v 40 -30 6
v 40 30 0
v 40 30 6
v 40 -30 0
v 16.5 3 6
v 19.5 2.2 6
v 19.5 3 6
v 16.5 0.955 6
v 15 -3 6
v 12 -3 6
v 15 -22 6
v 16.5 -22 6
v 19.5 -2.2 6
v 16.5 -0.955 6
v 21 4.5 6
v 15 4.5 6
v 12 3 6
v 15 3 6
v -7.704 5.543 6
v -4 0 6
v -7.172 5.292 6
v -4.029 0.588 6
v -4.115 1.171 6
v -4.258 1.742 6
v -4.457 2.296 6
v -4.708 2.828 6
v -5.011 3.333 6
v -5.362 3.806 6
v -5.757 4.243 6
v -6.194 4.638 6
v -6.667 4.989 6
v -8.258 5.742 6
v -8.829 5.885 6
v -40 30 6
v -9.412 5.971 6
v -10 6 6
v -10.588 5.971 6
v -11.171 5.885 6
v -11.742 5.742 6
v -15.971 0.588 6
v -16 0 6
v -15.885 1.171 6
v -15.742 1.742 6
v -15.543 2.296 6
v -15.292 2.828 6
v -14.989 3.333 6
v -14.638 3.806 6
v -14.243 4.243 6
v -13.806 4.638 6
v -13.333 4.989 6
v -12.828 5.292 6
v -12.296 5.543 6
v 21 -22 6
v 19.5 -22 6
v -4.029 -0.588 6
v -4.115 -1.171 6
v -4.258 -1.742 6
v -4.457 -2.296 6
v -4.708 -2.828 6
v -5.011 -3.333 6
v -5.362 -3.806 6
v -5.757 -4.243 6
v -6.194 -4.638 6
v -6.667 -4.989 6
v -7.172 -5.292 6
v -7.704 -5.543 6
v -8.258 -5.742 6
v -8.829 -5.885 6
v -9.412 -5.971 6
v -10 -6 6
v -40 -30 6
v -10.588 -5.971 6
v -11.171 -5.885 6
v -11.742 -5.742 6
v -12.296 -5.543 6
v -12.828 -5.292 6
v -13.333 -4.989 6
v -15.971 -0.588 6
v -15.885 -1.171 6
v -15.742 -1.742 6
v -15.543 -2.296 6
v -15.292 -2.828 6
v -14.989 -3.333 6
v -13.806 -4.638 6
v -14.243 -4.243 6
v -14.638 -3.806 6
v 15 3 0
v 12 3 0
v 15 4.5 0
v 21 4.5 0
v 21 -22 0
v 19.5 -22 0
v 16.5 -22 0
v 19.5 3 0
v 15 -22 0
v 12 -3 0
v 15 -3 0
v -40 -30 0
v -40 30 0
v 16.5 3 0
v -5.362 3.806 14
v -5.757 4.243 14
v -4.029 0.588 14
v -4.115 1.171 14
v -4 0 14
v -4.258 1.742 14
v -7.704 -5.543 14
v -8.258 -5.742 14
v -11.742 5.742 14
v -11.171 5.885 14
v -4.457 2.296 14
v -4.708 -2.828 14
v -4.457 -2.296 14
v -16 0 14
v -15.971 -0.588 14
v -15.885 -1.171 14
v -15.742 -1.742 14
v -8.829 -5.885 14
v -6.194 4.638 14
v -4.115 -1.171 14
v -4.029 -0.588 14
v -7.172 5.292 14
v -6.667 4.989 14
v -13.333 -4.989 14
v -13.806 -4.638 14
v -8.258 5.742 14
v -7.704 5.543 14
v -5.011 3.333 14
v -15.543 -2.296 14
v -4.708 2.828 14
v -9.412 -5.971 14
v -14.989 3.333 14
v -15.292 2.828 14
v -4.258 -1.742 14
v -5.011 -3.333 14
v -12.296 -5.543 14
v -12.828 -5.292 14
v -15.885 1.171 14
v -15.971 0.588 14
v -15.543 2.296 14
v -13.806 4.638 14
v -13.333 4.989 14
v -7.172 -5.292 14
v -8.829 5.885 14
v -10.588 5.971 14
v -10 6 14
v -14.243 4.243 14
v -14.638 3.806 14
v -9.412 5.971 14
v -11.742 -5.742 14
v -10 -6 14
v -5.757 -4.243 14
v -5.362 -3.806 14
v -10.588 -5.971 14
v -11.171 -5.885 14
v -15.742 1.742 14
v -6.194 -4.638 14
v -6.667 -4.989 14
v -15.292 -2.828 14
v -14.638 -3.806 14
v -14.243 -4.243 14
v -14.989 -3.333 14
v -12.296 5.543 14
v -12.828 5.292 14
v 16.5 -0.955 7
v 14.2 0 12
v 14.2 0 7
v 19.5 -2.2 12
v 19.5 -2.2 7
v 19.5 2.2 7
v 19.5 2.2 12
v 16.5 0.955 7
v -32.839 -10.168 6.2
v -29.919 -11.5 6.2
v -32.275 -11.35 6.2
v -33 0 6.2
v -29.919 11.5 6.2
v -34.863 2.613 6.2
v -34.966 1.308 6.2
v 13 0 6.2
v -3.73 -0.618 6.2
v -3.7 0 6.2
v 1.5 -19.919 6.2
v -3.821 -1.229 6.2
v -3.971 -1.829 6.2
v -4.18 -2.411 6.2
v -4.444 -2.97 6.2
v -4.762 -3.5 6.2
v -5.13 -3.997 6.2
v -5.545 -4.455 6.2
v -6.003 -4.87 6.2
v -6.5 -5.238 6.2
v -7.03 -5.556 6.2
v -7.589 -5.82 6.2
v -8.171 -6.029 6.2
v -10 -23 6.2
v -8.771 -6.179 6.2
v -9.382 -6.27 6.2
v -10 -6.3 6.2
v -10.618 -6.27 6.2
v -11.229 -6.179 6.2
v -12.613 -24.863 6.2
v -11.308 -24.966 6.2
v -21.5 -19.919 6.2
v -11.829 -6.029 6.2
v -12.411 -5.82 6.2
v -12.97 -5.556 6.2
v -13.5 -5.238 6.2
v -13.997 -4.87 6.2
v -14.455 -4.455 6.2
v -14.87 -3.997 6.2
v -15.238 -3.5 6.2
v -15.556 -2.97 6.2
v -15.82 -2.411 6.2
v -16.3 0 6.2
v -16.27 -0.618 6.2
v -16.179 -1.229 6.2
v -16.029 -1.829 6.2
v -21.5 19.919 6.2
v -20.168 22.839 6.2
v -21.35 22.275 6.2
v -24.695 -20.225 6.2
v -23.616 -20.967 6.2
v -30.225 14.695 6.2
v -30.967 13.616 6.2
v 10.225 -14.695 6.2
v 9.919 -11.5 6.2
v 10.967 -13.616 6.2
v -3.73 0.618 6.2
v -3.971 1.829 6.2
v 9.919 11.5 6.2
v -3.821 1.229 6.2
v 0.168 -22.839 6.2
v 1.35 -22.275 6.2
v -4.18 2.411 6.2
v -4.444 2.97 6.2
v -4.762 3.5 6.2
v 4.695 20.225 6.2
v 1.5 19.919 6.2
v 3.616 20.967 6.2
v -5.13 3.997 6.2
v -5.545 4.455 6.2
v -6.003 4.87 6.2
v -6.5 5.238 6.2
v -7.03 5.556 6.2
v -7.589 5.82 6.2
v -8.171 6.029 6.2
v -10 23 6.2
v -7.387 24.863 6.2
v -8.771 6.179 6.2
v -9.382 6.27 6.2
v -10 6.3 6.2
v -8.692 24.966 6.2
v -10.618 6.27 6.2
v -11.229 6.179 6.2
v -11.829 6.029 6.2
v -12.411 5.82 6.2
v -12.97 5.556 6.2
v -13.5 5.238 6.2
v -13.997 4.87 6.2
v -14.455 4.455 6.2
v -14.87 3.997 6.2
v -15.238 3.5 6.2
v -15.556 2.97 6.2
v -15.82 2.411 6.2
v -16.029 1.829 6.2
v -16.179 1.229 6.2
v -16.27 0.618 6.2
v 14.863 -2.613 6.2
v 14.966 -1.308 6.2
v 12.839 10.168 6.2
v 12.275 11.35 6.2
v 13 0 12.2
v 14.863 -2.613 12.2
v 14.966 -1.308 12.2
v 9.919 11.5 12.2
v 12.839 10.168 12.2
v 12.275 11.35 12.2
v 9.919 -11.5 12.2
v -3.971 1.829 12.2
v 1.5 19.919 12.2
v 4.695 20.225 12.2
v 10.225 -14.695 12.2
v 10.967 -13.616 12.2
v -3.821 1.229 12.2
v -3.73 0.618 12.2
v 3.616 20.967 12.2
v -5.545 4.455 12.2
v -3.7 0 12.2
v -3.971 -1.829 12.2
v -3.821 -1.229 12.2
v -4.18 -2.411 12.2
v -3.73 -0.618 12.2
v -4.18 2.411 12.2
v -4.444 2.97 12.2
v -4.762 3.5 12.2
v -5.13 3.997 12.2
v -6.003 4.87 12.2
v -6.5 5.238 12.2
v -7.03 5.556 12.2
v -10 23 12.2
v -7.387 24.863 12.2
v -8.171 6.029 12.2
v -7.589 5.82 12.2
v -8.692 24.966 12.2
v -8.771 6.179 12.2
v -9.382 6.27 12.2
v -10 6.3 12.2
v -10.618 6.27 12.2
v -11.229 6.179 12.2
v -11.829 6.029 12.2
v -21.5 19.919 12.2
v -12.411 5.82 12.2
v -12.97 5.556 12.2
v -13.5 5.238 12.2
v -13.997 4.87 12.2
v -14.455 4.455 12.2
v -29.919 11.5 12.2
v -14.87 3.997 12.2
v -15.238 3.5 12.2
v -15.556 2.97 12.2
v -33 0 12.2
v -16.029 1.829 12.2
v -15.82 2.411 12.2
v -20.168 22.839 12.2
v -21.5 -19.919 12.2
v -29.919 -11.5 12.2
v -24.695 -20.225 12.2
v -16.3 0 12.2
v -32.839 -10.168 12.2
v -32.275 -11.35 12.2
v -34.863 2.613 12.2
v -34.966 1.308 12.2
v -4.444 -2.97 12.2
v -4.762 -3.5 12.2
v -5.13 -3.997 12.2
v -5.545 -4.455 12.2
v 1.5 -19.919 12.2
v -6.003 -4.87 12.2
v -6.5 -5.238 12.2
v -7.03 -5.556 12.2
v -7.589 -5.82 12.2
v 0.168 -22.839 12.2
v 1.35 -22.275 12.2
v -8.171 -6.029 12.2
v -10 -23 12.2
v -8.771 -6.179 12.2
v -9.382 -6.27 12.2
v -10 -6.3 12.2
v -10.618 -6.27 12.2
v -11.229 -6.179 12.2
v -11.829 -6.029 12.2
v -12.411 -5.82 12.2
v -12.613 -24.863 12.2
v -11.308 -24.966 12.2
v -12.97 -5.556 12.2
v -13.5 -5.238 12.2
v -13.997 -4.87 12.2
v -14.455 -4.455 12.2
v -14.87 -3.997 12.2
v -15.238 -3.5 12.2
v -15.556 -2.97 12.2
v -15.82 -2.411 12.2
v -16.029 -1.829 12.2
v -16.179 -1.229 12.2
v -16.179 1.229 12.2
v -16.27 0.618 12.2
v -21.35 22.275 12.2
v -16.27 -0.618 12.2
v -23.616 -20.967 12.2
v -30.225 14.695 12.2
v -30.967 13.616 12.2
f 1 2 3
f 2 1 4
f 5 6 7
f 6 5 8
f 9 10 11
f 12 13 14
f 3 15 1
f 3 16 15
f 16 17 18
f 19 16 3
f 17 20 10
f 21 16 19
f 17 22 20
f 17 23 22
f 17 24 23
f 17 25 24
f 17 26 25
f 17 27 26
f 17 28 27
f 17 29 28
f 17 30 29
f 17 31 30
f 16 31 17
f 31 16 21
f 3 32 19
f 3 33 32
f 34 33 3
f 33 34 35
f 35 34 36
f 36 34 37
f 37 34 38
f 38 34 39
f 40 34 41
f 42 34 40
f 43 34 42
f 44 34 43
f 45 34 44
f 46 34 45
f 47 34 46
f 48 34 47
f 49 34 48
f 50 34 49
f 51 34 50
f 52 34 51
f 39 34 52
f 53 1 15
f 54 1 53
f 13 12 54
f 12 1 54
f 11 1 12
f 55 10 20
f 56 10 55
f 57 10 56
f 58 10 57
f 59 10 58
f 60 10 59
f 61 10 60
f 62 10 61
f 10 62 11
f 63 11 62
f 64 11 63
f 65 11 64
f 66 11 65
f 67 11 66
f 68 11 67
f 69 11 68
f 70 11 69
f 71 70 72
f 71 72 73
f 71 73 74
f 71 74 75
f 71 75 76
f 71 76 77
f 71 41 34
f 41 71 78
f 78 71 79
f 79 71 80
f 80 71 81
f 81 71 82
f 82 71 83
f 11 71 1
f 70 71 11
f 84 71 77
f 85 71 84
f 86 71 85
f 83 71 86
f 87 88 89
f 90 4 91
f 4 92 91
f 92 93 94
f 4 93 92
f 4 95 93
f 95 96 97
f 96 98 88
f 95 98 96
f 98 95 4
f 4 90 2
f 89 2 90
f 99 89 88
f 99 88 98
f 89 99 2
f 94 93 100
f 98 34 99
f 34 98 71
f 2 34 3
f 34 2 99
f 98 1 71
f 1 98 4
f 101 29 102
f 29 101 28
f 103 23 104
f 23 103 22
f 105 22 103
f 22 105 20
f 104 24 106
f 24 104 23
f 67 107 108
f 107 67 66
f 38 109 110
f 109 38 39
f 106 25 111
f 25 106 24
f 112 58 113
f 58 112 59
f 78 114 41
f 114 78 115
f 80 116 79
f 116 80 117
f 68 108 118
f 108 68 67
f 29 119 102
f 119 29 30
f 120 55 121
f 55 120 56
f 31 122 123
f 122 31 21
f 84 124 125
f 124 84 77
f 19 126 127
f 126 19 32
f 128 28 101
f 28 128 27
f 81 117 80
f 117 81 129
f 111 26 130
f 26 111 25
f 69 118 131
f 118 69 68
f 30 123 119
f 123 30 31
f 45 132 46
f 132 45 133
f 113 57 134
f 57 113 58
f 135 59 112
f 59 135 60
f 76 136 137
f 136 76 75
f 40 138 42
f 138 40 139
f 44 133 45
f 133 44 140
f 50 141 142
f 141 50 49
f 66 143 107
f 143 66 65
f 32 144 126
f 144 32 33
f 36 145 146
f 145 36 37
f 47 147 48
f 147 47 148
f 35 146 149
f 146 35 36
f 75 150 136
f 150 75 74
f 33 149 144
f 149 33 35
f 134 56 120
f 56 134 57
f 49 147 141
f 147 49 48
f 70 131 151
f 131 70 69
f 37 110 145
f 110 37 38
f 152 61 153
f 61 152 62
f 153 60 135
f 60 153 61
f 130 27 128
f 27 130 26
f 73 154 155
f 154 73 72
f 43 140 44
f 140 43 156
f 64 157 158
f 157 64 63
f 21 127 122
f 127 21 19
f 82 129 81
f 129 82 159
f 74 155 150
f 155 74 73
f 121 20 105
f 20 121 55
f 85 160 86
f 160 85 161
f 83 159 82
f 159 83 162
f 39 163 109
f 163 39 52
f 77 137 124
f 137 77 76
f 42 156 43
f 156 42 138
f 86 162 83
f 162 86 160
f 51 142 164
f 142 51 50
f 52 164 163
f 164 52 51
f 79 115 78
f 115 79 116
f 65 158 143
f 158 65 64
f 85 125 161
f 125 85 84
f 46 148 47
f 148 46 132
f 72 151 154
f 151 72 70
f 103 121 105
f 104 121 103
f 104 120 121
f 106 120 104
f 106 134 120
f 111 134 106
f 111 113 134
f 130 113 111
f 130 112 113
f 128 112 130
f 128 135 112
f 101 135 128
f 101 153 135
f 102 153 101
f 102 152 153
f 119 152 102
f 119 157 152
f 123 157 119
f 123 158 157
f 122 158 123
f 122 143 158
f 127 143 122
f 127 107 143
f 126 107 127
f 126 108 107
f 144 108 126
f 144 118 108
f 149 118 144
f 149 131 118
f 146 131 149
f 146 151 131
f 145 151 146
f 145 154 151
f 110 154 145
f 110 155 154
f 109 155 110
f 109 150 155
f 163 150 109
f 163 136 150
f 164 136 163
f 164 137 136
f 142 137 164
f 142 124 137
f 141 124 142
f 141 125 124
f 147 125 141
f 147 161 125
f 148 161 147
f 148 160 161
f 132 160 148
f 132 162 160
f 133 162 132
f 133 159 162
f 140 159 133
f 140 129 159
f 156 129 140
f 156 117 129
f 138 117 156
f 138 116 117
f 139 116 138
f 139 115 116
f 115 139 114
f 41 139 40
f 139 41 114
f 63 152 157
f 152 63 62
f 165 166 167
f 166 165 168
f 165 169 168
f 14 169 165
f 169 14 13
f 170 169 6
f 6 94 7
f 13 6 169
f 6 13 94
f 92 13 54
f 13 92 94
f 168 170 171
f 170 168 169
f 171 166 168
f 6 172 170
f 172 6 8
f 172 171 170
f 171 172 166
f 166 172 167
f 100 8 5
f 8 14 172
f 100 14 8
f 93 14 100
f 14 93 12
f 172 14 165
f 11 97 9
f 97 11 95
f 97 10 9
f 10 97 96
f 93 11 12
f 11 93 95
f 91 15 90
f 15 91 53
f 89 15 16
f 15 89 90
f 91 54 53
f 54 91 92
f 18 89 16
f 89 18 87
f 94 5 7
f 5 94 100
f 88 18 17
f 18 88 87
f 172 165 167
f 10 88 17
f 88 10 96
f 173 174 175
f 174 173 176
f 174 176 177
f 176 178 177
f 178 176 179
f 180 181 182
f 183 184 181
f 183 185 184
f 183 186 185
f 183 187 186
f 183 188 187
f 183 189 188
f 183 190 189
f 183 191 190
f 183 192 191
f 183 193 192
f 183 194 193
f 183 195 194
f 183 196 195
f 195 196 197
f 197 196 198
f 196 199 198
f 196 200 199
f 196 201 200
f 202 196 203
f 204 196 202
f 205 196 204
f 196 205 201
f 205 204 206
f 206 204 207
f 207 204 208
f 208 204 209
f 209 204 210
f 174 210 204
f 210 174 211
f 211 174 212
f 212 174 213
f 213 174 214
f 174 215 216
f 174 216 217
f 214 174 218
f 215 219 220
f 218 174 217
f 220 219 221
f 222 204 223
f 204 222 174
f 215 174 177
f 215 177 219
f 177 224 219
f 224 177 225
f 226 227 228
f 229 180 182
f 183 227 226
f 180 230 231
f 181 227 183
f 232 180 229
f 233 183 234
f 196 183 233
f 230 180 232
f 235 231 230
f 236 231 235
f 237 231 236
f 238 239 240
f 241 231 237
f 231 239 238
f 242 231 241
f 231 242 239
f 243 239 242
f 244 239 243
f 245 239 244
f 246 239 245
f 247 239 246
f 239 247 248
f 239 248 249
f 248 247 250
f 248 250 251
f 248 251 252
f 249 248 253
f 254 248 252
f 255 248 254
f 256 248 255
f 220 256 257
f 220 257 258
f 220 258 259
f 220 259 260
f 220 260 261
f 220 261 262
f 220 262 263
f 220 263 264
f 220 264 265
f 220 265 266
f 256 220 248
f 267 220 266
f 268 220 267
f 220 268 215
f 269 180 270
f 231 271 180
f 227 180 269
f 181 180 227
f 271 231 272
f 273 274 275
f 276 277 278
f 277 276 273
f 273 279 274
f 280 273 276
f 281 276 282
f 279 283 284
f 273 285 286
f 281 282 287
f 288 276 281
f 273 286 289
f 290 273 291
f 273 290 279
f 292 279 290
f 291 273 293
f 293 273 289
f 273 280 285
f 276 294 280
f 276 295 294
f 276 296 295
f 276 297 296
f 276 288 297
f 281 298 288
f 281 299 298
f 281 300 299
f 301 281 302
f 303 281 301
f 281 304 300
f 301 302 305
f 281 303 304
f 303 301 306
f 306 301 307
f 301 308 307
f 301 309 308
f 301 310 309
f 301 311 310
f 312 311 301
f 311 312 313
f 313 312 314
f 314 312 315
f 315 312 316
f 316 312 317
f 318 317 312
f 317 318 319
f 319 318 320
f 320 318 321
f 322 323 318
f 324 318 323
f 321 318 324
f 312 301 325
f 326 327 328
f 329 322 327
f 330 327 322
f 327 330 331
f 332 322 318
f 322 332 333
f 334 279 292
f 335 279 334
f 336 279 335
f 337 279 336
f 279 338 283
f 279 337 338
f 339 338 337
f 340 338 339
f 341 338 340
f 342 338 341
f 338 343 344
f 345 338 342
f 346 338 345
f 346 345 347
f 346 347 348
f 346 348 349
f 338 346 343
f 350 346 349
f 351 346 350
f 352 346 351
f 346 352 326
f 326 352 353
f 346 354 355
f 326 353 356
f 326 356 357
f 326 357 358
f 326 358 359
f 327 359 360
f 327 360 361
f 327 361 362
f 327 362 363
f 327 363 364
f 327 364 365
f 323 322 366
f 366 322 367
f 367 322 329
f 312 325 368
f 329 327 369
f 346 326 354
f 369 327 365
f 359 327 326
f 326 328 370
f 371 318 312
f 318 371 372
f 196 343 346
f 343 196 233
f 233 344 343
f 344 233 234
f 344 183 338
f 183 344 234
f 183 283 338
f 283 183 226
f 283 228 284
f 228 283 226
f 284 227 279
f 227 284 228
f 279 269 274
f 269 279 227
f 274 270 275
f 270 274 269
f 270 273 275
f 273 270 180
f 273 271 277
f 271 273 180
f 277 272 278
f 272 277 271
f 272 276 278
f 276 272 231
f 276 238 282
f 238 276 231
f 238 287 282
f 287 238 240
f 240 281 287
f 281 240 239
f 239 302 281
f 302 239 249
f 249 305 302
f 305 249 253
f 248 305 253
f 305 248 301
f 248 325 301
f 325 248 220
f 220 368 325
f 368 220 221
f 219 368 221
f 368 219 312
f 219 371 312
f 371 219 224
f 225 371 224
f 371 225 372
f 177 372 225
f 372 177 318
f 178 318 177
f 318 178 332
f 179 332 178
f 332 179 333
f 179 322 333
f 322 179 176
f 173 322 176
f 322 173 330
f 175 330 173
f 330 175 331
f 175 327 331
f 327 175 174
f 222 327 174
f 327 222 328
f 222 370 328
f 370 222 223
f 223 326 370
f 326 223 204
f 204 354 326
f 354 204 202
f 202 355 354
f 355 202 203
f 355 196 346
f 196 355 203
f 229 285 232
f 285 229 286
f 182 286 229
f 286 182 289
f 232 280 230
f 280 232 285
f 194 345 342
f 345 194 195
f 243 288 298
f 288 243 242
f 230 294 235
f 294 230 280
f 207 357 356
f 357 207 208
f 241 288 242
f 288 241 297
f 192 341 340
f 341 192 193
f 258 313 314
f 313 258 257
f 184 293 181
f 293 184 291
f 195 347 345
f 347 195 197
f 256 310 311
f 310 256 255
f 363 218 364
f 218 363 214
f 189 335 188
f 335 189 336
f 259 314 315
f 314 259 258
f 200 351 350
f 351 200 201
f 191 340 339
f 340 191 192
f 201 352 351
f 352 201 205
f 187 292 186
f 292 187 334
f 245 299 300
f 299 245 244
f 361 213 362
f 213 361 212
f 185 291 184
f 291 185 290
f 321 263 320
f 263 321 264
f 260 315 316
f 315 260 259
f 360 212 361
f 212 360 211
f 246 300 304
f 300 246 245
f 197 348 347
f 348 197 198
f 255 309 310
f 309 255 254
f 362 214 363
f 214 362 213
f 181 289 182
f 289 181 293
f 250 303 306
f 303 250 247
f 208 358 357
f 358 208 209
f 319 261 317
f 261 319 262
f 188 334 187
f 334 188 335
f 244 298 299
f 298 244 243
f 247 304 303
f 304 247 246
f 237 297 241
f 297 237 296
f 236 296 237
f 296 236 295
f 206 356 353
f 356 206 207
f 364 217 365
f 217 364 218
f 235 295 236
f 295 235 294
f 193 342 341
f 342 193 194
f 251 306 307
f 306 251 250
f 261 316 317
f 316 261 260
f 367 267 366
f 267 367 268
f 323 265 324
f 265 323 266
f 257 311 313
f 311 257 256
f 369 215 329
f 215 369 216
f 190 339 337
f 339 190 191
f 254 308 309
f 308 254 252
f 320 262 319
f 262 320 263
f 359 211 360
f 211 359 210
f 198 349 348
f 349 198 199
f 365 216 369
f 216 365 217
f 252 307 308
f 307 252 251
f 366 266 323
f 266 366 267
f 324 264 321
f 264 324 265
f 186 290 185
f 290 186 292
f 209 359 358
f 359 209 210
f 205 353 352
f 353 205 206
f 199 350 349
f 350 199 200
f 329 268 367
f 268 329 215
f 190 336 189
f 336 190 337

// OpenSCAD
/* Ratchet wheel with spring pawl - desk demo, PLA, 0.4 mm nozzle, no supports.
   Wheel (~50 mm, 12 teeth) turns on a post; the pawl is part of the base on a
   flexible arm cut from the plate. Free way is clockwise seen from above
   (negative rotation about +Z). */
part = "assembly"; // [wheel:Wheel, base:Base, assembly:Assembly]

cadverify_only = "";
module instance(name, part, unit = 1) {
    echo(cadverify_instance = [name, part, unit]);
    if (cadverify_only == "" || cadverify_only == name) children();
}

// ---------- parameters (mm) ----------
Rtip = 25;          // wheel outer radius (50 mm across)
Rroot = 23;         // wheel root radius (tooth height 2 mm)
wheel_t = 6;        // wheel thickness
hole_D = 12.6;      // wheel centre hole diameter
post_D = 12;        // base post diameter (0.6 mm play on diameter)
post_h = 8;         // post height above base top
base_t = 6;         // base plate thickness
base_x = 80;
base_y = 60;
wheel_cx = -10;     // wheel centre in base/assembly XY
wheel_cy = 0;
wheel_gap = 0.2;    // wheel bottom above base top
wheel_lift_z = base_t + wheel_gap;   // 6.2 wheel bottom in assembly
post_top_z = base_t + post_h;        // 14
pawl_tip_x = 14.2;  // pawl tip: 0.8 inside tip circle, 1.2 off root
beam_x0 = 16.5; beam_x1 = 19.5;      // flexible arm: 3 mm wide ...
beam_y0 = -22; beam_y1 = 3;          // ... 25 mm long, fixed south, free north
slot_w = 1.5;       // slot width (clears a 0.4 mm nozzle)
pawl_h = 6;         // pawl height above plate (meets wheel band 6.2..12.2)
rest_angle = 0;     // gullet bottom centred on pawl tip

// tooth k: root at 30k, shallow rise to tip at 30k+24, tip land to +27,
// steep drop to root at +30. Shallow face cams the pawl out (free way),
// steep face pushes along the arm (locks reverse).
function wheel_pts() = [
    for(k=[0:11]) for(j=[0:2])
        j==0 ? [Rroot*cos(k*30), Rroot*sin(k*30)]
      : j==1 ? [Rtip*cos(k*30+24), Rtip*sin(k*30+24)]
             : [Rtip*cos(k*30+27), Rtip*sin(k*30+27)]
];

module wheel() {
    difference() {
        linear_extrude(height=wheel_t, convexity=4)
            polygon(points=wheel_pts());
        translate([0,0,-1]) cylinder(d=hole_D, h=wheel_t+2, $fn=64);
    }
}

module base() {
    difference() {
        union() {
            // plate
            translate([-base_x/2, -base_y/2, 0]) cube([base_x, base_y, base_t]);
            // post the wheel turns on
            translate([wheel_cx, wheel_cy, base_t]) cylinder(d=post_D, h=post_h, $fn=64);
            // pawl wedge: tip near the wheel, root fused onto the free end of the arm
            translate([0,0,base_t]) linear_extrude(height=pawl_h, convexity=2)
                polygon(points=[[pawl_tip_x, 0],[beam_x1, 2.2],[beam_x1, -2.2]]);
        }
        // U-slot freeing the arm (one connected through opening) + window under pawl tip
        translate([beam_x0-slot_w, beam_y0, -1]) cube([slot_w, 19, base_t+2]); // west x15..16.5 y-22..-3
        translate([beam_x1, beam_y0, -1]) cube([slot_w, 26.5, base_t+2]);      // east x19.5..21 y-22..4.5
        translate([beam_x0-slot_w, beam_y1, -1]) cube([6, slot_w, base_t+2]);  // north x15..21 y3..4.5
        translate([12, -3, -1]) cube([4.5, 6, base_t+2]);                       // window x12..16.5 y-3..3
    }
}

module assembly() {
    instance("base_inst", "base", 1) base();
    instance("wheel_inst", "wheel", 1)
        translate([wheel_cx, wheel_cy, wheel_lift_z]) rotate([0,0,rest_angle]) wheel();
}

// ---------- specs (computed from parameters) ----------
wheel_spec = [
    ["bounds", [[-Rtip, -Rtip, 0], [Rtip, Rtip, wheel_t]]],
    ["bodies", 1],
    ["through_holes", 1],
    ["support_faces", [["bed", "-z", 800]]],
    ["overhangs_allowed", []],
    ["copies", 1],
    ["details", [
        ["axle_hole", "hole", [0, 0, wheel_t+4], [0, 0, -1], [[0, hole_D], [wheel_t, hole_D]]],
        ["rim_thick", "thickness", [15, 0, wheel_t+4], [0, 0, -1], wheel_t],
        ["tooth0", "material", [[22.05, 7.71, 0], [23.05, 8.71, wheel_t]], 0.5],
        ["tooth4", "material", [[-18.89, 14.93, 0], [-17.89, 15.93, wheel_t]], 0.5],
        ["tooth8", "material", [[-4.67, -24.14, 0], [-3.67, -23.14, wheel_t]], 0.5]
    ]]
];

base_spec = [
    ["bounds", [[-base_x/2, -base_y/2, 0], [base_x/2, base_y/2, post_top_z]]],
    ["bodies", 1],
    ["through_holes", 1],
    ["support_faces", [["bed", "-z", 2000]]],
    ["overhangs_allowed", [["pawl bridges slot", [[14, -1.5, 5.9], [17, 1.5, 6.1]]]]],
    ["copies", 1],
    ["details", [
        ["plate_thick", "thickness", [0, -28, base_t+4], [0, 0, -1], base_t],
        ["post_dia", "thickness", [wheel_cx-10, wheel_cy, base_t+post_h-1], [1, 0, 0], post_D],
        ["post_core", "material", [[wheel_cx-2, -2, 8], [wheel_cx+2, 2, 13]], 0.8],
        ["arm_width", "thickness", [beam_x0-0.75, -16, 3], [1, 0, 0], beam_x1-beam_x0],
        ["arm_full", "material", [[17, -20, 0], [19, -12, base_t]], 0.8],
        ["slot_gap", "void", [[beam_x0-slot_w, -20, 0], [beam_x0, -10, base_t]], 0.8],
        ["window_void", "void", [[12.5, -2.5, 0], [16, 2.5, base_t]], 0.8],
        ["pawl_tip", "material", [[14.9, -0.2, 8], [15.7, 0.2, 11]], 0.5],
        ["pawl_height", "thickness", [14.5, 0, base_t+pawl_h+3], [0, 0, -1], pawl_h]
    ]]
];

assembly_spec = [
    ["bounds", [[-base_x/2, -base_y/2, 0], [base_x/2, base_y/2, post_top_z]]],
    ["support_faces", [["desk", "-z", 2000]]],
    ["allowed_interferences", []],
    ["motions", [
        ["spin_free", ["wheel_inst"], "rotate", [wheel_cx, wheel_cy, wheel_lift_z], [0, 0, 1], [0, -360],
            ["flex", [["wheel_inst", "base_inst", 0.9, "pawl clicks over teeth"]]]]
    ]],
    ["assembly_order", [
        [["base_inst"], [0, 0, 0]],
        [["wheel_inst"], [0, 0, -1]]
    ]]
];

if (part == "wheel") {
    echo(cadverify_spec = wheel_spec);
    wheel();
} else if (part == "base") {
    echo(cadverify_spec = base_spec);
    base();
} else {
    echo(cadverify_spec = assembly_spec);
    assembly();
}
